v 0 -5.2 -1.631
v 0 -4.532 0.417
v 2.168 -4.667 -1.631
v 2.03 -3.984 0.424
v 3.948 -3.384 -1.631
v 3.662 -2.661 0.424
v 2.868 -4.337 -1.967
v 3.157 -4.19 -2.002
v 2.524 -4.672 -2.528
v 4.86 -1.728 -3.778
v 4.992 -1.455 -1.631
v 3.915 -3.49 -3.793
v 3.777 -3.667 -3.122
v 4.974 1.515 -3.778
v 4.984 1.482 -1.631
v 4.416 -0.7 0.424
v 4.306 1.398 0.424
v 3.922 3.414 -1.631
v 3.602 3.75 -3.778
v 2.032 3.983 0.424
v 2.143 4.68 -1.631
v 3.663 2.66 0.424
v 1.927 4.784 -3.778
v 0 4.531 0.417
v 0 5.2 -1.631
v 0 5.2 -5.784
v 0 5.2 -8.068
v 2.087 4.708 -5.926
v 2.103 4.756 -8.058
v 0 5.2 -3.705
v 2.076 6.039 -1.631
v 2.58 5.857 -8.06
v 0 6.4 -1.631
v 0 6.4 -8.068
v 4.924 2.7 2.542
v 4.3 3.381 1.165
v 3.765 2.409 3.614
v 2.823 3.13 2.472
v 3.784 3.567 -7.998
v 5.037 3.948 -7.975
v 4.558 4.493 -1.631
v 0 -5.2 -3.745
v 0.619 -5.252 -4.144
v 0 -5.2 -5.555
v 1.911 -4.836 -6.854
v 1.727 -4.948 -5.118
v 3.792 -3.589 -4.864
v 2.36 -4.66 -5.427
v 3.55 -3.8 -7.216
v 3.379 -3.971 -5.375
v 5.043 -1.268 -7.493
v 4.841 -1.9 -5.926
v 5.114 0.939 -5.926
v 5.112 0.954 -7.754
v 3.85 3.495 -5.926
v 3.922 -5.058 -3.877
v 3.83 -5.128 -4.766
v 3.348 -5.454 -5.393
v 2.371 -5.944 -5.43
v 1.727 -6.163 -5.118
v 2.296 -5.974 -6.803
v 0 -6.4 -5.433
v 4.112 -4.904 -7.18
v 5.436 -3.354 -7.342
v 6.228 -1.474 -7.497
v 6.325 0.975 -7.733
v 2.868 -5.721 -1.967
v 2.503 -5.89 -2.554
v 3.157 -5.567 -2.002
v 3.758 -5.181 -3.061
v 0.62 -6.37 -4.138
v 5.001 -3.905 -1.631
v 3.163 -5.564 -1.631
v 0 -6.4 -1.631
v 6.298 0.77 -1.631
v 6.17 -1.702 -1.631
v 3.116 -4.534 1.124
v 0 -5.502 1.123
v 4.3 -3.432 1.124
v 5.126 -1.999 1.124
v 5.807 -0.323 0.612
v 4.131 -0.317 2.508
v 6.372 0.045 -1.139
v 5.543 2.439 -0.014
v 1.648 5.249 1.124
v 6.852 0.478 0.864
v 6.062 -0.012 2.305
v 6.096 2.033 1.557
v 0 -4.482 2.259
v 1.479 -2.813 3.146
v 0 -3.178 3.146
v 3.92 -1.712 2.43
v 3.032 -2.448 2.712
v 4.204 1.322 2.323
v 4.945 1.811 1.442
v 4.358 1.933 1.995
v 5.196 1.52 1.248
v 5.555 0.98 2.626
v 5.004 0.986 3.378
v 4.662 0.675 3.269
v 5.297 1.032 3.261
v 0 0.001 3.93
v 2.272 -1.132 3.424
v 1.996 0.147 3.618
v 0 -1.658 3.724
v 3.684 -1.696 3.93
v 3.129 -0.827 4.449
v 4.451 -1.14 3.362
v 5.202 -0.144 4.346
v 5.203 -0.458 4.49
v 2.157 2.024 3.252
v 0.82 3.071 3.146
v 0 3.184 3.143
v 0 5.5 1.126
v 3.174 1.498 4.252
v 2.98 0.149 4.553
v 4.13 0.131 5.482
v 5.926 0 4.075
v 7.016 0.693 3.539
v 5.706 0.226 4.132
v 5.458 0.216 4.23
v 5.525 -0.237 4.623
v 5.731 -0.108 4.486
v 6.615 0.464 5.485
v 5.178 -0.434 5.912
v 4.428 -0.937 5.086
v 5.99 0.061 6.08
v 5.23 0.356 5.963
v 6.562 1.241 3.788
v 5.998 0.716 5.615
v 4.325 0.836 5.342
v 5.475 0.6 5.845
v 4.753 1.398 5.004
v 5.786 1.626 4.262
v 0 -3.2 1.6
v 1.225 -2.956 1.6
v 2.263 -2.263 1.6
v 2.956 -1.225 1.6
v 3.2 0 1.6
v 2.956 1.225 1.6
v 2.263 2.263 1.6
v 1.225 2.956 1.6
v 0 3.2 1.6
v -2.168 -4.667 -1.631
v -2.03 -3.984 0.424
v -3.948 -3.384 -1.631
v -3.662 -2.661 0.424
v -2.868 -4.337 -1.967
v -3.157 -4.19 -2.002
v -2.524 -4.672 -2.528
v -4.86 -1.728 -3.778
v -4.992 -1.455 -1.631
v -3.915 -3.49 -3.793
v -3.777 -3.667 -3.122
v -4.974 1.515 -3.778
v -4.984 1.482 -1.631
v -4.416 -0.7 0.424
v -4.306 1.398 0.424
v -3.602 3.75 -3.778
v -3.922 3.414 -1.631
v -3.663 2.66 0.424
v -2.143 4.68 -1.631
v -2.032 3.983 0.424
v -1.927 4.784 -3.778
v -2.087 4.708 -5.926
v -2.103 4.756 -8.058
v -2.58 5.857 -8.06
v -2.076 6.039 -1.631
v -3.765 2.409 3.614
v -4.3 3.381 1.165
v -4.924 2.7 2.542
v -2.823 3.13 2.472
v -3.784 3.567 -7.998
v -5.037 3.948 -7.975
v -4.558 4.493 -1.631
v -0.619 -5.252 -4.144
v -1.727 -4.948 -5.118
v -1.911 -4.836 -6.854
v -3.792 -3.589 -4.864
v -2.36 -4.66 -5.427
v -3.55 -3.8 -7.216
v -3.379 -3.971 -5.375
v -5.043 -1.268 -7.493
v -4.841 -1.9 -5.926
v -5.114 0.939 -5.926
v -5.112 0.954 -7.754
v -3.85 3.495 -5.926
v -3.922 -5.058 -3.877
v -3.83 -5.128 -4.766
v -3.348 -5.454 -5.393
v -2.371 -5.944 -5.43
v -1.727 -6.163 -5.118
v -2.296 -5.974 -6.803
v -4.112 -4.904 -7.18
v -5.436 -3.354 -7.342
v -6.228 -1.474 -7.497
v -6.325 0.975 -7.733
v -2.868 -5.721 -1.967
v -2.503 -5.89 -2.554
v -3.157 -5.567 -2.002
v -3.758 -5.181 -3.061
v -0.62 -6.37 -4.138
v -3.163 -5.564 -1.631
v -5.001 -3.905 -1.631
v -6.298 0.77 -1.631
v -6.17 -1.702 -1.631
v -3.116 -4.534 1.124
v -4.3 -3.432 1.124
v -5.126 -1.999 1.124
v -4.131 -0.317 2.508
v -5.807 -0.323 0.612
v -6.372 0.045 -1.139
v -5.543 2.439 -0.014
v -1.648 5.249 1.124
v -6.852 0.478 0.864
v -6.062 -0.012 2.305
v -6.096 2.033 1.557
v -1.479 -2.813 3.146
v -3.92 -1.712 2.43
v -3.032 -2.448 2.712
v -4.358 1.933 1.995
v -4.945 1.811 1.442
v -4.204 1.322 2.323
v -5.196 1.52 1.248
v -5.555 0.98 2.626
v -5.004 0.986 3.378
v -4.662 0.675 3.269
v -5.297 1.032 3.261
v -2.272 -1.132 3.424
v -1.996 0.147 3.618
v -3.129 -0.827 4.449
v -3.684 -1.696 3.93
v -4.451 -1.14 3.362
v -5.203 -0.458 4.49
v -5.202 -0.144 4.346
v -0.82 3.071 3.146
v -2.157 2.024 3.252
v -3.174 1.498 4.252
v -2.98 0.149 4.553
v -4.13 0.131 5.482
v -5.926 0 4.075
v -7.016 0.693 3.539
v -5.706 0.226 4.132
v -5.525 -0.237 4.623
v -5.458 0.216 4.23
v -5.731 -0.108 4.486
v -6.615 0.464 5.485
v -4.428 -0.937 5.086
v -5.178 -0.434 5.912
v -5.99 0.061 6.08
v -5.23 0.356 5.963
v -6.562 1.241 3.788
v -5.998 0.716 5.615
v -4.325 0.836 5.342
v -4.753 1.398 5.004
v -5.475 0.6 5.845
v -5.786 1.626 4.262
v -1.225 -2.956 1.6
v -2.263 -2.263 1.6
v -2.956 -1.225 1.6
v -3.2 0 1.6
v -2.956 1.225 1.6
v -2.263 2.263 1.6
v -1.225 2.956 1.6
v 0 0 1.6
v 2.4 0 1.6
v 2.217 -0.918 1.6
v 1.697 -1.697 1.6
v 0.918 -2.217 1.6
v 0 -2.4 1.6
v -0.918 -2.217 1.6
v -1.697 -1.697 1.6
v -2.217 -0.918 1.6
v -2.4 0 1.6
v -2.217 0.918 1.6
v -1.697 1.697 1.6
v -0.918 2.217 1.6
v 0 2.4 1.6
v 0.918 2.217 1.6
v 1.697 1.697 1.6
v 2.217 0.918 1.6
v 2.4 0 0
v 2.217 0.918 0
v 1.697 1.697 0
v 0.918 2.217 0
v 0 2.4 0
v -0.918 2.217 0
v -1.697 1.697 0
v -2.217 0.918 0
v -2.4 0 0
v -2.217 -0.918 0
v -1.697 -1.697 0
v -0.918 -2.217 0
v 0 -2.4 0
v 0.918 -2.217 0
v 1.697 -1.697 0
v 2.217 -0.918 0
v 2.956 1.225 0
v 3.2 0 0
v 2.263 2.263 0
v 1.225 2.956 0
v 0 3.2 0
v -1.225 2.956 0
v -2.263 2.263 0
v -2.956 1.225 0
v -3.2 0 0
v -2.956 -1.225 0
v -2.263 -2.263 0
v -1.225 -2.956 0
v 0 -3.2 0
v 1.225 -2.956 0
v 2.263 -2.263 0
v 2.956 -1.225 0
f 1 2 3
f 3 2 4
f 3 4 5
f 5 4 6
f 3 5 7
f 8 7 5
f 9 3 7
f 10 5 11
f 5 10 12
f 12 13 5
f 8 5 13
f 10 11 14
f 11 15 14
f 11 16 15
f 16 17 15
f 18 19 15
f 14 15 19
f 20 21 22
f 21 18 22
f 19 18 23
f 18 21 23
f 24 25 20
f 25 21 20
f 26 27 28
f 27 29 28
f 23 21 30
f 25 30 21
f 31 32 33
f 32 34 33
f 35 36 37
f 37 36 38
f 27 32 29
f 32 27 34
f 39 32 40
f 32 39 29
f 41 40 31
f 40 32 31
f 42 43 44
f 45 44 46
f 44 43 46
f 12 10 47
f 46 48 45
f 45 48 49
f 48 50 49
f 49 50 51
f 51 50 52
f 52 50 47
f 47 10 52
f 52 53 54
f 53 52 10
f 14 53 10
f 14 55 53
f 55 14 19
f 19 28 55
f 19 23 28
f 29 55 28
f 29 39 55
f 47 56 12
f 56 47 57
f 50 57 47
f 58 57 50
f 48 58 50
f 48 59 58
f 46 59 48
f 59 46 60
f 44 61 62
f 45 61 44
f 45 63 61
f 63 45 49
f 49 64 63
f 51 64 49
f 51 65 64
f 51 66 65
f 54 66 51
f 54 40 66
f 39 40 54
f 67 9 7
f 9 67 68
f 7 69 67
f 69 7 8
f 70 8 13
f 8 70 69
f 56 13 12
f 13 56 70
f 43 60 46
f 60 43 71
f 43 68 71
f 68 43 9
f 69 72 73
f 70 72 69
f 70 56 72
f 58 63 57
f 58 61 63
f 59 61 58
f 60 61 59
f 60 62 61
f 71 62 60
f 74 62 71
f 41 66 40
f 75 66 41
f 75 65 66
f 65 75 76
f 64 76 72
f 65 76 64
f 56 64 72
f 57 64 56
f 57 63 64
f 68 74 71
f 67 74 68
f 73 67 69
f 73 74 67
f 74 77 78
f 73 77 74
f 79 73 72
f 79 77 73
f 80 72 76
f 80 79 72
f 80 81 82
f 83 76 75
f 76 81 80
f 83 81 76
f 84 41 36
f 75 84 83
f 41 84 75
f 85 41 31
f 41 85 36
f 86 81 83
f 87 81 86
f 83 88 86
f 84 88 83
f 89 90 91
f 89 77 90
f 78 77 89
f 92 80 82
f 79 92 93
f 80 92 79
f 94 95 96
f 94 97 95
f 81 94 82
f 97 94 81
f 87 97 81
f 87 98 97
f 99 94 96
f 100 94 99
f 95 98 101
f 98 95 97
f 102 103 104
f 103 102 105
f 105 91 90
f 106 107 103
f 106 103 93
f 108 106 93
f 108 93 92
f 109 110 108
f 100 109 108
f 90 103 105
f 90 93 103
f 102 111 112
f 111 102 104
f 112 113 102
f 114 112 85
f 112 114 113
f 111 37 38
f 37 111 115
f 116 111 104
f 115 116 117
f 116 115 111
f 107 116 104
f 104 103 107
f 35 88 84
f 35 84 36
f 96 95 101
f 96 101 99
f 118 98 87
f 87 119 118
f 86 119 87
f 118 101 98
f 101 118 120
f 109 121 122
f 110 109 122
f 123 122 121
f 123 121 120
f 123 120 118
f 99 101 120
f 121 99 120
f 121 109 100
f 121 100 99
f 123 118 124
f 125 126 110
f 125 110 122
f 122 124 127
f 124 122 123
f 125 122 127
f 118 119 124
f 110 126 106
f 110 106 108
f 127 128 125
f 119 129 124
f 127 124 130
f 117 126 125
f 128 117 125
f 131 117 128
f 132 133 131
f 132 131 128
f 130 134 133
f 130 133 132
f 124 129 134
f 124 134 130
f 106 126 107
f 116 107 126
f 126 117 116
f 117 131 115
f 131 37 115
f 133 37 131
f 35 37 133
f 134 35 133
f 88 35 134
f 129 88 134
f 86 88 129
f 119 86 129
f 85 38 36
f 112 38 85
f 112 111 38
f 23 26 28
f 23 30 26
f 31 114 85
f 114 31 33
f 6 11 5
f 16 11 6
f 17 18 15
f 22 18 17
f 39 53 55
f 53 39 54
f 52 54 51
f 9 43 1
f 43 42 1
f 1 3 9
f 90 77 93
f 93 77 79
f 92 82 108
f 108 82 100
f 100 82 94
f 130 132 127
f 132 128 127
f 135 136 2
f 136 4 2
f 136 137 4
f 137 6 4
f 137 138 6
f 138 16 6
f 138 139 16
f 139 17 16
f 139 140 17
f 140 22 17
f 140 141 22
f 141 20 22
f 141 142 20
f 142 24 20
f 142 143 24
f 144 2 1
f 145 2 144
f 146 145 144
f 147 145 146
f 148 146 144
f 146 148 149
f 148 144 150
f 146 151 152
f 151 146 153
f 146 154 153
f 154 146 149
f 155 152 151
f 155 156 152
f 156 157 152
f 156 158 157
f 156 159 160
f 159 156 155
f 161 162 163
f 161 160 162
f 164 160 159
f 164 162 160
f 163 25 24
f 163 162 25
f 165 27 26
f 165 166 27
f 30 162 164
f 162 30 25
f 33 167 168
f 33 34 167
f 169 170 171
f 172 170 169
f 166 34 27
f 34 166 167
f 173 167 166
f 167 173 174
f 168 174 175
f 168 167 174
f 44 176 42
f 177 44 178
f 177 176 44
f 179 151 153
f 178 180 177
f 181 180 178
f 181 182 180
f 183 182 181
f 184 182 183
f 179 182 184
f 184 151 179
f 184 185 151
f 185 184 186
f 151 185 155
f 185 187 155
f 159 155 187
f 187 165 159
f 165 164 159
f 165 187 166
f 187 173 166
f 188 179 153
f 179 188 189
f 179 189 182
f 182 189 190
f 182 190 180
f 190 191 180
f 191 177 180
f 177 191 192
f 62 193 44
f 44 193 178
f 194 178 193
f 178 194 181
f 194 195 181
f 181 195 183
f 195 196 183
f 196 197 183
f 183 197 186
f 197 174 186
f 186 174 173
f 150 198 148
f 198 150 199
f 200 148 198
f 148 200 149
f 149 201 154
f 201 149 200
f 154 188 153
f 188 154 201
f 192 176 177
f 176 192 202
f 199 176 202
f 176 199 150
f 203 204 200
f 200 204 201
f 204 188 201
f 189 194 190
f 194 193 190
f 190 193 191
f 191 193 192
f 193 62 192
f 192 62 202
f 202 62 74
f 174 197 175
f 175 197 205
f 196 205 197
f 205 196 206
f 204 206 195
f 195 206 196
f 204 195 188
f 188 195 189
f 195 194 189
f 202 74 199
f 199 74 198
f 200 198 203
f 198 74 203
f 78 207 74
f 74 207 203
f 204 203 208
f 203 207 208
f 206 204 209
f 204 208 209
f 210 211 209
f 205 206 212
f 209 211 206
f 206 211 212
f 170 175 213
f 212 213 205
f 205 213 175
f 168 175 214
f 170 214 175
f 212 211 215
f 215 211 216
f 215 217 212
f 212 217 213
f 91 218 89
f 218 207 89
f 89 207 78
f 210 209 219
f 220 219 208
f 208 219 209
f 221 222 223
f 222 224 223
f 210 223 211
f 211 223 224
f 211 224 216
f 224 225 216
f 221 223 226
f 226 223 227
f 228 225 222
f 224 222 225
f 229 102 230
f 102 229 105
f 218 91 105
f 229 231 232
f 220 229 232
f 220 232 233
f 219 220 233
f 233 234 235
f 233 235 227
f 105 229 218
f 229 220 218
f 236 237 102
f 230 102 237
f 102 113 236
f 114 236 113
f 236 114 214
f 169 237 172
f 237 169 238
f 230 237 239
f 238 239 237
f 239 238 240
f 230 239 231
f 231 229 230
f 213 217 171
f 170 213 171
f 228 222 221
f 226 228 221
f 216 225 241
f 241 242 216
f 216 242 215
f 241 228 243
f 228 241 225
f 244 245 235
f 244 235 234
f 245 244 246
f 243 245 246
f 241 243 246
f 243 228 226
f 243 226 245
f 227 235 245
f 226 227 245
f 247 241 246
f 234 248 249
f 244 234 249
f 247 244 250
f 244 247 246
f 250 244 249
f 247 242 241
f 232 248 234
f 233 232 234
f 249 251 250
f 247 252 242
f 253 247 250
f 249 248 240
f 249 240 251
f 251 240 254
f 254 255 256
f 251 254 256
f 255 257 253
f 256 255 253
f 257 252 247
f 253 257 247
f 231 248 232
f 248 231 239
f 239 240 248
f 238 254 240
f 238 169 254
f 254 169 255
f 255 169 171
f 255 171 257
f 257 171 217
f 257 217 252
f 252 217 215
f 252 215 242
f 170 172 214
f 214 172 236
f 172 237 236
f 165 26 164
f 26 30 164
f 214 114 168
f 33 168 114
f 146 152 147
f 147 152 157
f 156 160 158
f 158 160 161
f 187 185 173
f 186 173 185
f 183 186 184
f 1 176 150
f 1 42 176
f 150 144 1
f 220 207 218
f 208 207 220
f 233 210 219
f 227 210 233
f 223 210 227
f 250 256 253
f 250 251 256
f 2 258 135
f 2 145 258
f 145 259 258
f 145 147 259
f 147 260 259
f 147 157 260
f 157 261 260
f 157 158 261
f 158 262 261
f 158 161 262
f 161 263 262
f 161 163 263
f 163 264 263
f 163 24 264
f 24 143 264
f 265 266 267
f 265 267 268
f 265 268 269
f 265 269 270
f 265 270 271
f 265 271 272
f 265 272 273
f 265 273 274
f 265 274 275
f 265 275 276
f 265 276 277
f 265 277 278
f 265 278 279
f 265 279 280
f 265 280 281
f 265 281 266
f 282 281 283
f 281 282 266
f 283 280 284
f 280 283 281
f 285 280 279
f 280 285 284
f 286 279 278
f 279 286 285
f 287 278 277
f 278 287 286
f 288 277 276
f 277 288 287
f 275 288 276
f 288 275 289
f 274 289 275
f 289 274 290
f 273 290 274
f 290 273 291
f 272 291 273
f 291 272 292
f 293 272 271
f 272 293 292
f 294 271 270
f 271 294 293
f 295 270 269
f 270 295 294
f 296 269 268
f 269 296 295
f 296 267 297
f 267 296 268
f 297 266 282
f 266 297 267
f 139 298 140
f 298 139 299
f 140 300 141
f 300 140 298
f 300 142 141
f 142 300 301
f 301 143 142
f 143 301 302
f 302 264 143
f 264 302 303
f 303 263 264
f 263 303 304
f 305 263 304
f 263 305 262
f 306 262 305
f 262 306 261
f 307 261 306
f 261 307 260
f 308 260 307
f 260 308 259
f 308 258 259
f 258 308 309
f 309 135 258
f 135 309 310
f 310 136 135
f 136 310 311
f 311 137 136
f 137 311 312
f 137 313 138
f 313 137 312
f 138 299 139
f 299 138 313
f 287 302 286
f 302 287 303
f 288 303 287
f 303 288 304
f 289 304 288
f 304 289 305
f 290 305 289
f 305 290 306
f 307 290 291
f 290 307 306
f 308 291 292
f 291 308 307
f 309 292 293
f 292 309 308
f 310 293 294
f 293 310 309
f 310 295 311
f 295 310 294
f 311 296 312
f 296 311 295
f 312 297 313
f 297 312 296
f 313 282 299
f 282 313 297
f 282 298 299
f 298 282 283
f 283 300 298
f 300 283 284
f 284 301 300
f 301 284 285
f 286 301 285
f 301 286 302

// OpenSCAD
use <../lib.scad>
use <../p/4-4disc.scad>
use <s/98729s01.scad>
use <../p/stud4.scad>
function ldraw_lib__98729() = [
// 0 Minifig Headdress Catwoman
// 0 Name: 98729.dat
// 0 Author: Magnus Forsberg [MagFors]
// 0 !LDRAW_ORG Part UPDATE 2012-03
// 0 !LICENSE Licensed under CC BY 2.0 and CC BY 4.0 : see CAreadme.txt
// 
// 0 BFC CERTIFY CCW
  [0,"BFC","CERTIFY"],
  [0,"BFC","CCW"],
// 
// 0 !CATEGORY Minifig Headwear
// 
// 0 !HISTORY 2012-04-21 {LEGO Digital Designer} Original part shape
// 0 !HISTORY 2012-04-21 [MagFors] File preparation for LDraw Parts Tracker
// 0 !HISTORY 2012-12-28 [PTadmin] Official Update 2012-03
// 
// 
// 1 16 0 0 0 1 0 0 0 1 0 0 0 1 s\98729s01.dat
  [1,16,0,0,0,1,0,0,0,1,0,0,0,1, ldraw_lib__s__98729s01()],
// 1 16 0 0 0 -1 0 0 0 1 0 0 0 1 s\98729s01.dat
  [1,16,0,0,0,-1,0,0,0,1,0,0,0,1, ldraw_lib__s__98729s01()],
// 1 16 0 -4 0 6 0 0 0 -1 0 0 0 -6 4-4disc.dat
  [1,16,0,-4,0,6,0,0,0,-1,0,0,0,-6, ldraw_lib__4_4disc()],
// 1 16 0 -4 0 1 0 0 0 -1 0 0 0 1 stud4.dat
  [1,16,0,-4,0,1,0,0,0,-1,0,0,0,1, ldraw_lib__stud4()],
// 0 //
// 2 24 0 13.887 -13 0 13.582 -16
  [2,24,0,13.887,-13,0,13.582,-16],
// 5 24 0 -1.042 -11.329 0 4.078 -13 -5.419 4.078 -11.667 5.419 4.078 -11.667
  [5,24,0,-1.042,-11.329,0,4.078,-13,-5.419,4.078,-11.667,5.419,4.078,-11.667],
// 5 24 0 4.078 13 0 -1.042 11.328 -5.08 -1.059 9.957 5.08 -1.059 9.957
  [5,24,0,4.078,13,0,-1.042,11.328,-5.08,-1.059,9.957,5.08,-1.059,9.957],
// 5 24 0 -1.042 11.328 0 -4 8 -3.0616 -4 7.3912 3.0616 -4 7.3912
  [5,24,0,-1.042,11.328,0,-4,8,-3.0616,-4,7.3912,3.0616,-4,7.3912],
// 5 24 0 -1.042 -11.329 0 -4 -8 -3.0616 -4 -7.3912 3.0616 -4 -7.3912
  [5,24,0,-1.042,-11.329,0,-4,-8,-3.0616,-4,-7.3912,3.0616,-4,-7.3912],
// 5 24 0 20.171 13 0 14.461 12.999 -5.217 14.814 11.771 5.217 14.814 11.771
  [5,24,0,20.171,13,0,14.461,12.999,-5.217,14.814,11.771,5.217,14.814,11.771],
// 5 24 0 9.263 13 0 4.078 13 -5.358 4.078 11.701 5.358 4.078 11.701
  [5,24,0,9.263,13,0,4.078,13,-5.358,4.078,11.701,5.358,4.078,11.701],
// 5 24 0 4.078 16 0 20.171 16 -6.45 20.149 14.642 6.45 20.149 14.642
  [5,24,0,4.078,16,0,20.171,16,-6.45,20.149,14.642,6.45,20.149,14.642],
// 5 24 0 20.171 16 0 20.171 13 -5.257 20.146 11.89 5.257 20.146 11.89
  [5,24,0,20.171,16,0,20.171,13,-5.257,20.146,11.89,5.257,20.146,11.89],
// 5 24 0 9.362 -13 0 13.887 -13 -1.548 10.359 -12.908 1.548 10.359 -12.908
  [5,24,0,9.362,-13,0,13.887,-13,-1.548,10.359,-12.908,1.548,10.359,-12.908],
// 5 24 0 13.582 -16 0 4.078 -16 -1.549 10.344 -15.925 1.549 10.344 -15.925
  [5,24,0,13.582,-16,0,4.078,-16,-1.549,10.344,-15.925,1.549,10.344,-15.925],
// 5 24 0 4.078 -16 0 -2.808 -13.756 -7.789 -2.81 -11.336 7.789 -2.81 -11.336
  [5,24,0,4.078,-16,0,-2.808,-13.756,-7.789,-2.81,-11.336,7.789,-2.81,-11.336],
// 5 24 0 -5.647 -11.205 0 -7.864 -7.945 -3.698 -7.864 -7.032 3.698 -7.864 -7.032
  [5,24,0,-5.647,-11.205,0,-7.864,-7.945,-3.698,-7.864,-7.032,3.698,-7.864,-7.032],
// 5 24 0 -2.808 -13.756 0 -5.647 -11.205 -7.789 -2.81 -11.336 7.789 -2.81 -11.336
  [5,24,0,-2.808,-13.756,0,-5.647,-11.205,-7.789,-2.81,-11.336,7.789,-2.81,-11.336],
// 5 24 0 -9.31 -4.145 0 -9.824 0.003 -4.989 -9.046 0.367 4.989 -9.046 0.367
  [5,24,0,-9.31,-4.145,0,-9.824,0.003,-4.989,-9.046,0.367,4.989,-9.046,0.367],
// 5 24 0 -7.864 -7.945 0 -9.31 -4.145 -3.698 -7.864 -7.032 3.698 -7.864 -7.032
  [5,24,0,-7.864,-7.945,0,-9.31,-4.145,-3.698,-7.864,-7.032,3.698,-7.864,-7.032],
// 5 24 0 -9.824 0.003 0 -7.857 7.959 -2.049 -7.864 7.677 2.049 -7.864 7.677
  [5,24,0,-9.824,0.003,0,-7.857,7.959,-2.049,-7.864,7.677,2.049,-7.864,7.677],
// 5 24 0 -7.857 7.959 0 -2.815 13.751 -4.12 -2.81 13.123 4.12 -2.81 13.123
  [5,24,0,-7.857,7.959,0,-2.815,13.751,-4.12,-2.81,13.123,4.12,-2.81,13.123],
// 5 24 0 14.461 12.999 0 9.263 13 -4.818 9.445 11.961 4.818 9.445 11.961
  [5,24,0,14.461,12.999,0,9.263,13,-4.818,9.445,11.961,4.818,9.445,11.961],
// 5 24 0 -2.815 13.751 0 4.078 16 -5.189 4.078 15.097 5.189 4.078 15.097
  [5,24,0,-2.815,13.751,0,4.078,16,-5.189,4.078,15.097,5.189,4.078,15.097],
// 5 24 0 4.078 -13 0 9.362 -13 -1.548 10.359 -12.908 1.548 10.359 -12.908
  [5,24,0,4.078,-13,0,9.362,-13,-1.548,10.359,-12.908,1.548,10.359,-12.908],
];
module ldraw_lib__98729(step=0, col=false, unit=2/5, alt=false, line=0.2, solid=!$preview)
    makepoly(ldraw_lib__98729(), step=step, col=col, unit=unit, alt=alt, line=line, solid=solid);
ldraw_lib__98729(line=0.2);
